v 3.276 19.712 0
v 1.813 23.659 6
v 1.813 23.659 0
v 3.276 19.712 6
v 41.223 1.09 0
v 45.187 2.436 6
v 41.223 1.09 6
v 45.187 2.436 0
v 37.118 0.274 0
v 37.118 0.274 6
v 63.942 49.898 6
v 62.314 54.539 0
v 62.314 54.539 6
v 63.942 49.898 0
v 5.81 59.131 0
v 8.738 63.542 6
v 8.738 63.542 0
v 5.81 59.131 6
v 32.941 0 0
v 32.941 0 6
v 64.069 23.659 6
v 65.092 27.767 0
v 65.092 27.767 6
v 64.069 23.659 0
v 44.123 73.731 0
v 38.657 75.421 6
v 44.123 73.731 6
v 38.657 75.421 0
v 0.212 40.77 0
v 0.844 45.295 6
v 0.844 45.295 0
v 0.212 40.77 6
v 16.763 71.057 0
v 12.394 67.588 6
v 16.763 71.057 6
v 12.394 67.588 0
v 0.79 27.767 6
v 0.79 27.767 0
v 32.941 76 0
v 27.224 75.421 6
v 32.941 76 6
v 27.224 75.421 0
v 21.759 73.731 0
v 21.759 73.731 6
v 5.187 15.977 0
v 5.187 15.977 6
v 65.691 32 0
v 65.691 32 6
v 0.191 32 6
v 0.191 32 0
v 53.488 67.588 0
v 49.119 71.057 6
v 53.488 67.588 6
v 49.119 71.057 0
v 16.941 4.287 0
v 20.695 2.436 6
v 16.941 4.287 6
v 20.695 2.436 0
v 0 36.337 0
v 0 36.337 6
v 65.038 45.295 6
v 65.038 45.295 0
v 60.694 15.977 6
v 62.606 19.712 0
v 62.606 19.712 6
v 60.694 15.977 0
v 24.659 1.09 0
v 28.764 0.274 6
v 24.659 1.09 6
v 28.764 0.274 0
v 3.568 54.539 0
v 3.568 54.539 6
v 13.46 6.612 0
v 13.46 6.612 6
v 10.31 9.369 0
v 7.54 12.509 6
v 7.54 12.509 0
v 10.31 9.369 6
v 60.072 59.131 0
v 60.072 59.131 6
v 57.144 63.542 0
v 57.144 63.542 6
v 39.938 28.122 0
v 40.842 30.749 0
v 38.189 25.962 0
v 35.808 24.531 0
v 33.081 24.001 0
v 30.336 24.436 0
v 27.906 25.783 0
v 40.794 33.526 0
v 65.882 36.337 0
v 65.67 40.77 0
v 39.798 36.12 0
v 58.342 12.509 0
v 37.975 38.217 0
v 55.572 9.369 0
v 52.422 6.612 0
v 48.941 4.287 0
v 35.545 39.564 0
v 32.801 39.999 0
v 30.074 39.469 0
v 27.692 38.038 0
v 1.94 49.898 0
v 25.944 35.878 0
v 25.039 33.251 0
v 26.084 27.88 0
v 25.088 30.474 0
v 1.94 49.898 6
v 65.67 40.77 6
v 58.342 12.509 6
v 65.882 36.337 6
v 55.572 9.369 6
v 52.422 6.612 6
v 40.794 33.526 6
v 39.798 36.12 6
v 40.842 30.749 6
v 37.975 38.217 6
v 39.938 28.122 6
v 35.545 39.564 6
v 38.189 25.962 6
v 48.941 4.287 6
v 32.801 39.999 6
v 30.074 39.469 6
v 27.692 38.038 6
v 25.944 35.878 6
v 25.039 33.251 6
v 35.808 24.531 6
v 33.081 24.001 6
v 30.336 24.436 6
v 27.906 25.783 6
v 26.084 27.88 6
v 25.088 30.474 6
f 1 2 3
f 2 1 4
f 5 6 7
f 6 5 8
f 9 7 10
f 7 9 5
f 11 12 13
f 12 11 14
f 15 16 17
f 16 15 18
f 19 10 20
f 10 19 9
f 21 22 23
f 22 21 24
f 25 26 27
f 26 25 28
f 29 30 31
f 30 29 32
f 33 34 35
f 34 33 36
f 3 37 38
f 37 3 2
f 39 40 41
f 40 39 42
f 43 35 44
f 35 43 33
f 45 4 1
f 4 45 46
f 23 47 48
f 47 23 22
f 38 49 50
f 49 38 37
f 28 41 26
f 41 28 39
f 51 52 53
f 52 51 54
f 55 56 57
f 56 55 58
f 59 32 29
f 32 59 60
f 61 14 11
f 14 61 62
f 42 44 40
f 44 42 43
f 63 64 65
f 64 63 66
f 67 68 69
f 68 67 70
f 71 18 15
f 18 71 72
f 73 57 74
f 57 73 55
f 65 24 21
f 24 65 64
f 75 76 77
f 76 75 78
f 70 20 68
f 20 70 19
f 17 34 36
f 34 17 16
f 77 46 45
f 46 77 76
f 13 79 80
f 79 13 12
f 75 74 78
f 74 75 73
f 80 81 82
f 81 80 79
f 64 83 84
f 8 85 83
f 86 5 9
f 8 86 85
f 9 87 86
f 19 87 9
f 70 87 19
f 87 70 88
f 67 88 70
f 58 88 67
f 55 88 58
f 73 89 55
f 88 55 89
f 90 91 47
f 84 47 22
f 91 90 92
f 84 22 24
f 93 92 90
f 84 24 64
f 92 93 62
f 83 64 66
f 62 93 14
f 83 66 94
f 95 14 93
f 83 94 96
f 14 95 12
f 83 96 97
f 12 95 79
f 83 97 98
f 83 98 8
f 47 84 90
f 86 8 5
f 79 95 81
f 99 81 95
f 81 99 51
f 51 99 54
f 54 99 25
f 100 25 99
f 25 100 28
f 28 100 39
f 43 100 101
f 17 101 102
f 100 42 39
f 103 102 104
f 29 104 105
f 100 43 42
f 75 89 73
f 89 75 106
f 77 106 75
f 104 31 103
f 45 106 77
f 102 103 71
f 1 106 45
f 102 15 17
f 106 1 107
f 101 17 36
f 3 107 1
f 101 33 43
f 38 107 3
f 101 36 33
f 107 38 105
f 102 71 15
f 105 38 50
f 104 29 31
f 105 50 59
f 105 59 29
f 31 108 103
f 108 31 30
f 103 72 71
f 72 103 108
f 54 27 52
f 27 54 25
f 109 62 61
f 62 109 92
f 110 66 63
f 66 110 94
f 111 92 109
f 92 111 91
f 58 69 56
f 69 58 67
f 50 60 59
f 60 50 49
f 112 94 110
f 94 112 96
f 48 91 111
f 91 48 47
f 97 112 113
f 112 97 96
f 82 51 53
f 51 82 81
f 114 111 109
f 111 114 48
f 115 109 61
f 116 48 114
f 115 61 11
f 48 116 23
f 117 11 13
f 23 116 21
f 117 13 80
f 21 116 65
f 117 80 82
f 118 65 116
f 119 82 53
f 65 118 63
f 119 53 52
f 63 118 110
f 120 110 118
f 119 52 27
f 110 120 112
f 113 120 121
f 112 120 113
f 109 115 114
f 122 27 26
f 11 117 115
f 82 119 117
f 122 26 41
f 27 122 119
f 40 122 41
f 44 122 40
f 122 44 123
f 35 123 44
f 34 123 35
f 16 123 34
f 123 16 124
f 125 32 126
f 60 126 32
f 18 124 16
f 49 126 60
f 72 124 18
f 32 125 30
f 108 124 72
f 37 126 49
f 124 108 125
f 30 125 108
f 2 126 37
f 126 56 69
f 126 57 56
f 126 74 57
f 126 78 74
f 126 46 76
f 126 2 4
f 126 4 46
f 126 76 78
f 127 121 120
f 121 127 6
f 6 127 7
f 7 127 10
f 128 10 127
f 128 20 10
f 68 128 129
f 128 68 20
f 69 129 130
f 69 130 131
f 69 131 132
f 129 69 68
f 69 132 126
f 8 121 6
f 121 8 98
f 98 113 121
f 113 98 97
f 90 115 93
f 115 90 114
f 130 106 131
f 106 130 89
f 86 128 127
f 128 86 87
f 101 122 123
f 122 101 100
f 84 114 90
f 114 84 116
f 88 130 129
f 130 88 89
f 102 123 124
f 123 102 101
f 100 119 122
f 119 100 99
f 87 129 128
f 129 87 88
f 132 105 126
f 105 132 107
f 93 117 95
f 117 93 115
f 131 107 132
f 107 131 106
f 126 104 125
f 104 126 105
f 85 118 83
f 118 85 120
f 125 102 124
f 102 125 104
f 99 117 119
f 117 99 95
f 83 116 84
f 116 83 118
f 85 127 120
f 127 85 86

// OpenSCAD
$fn = 32;

// ----------------------------------------------------------------------
// Cam plate: single_lobe cam, base R32
// ----------------------------------------------------------------------

// --- parameters (mm) ---
base_r = 32;              // base circle radius
lobe_h = 12;              // cam lobe rise
bore_r = 8;               // shaft bore radius
plate_t = 6;              // plate thickness, Z (extrusion height)

profile = [[65.691, 32], [65.882, 36.337], [65.67, 40.77], [65.038, 45.295], [63.942, 49.898], [62.314, 54.539], [60.072, 59.131], [57.144, 63.542], [53.488, 67.588], [49.119, 71.057], [44.123, 73.731], [38.657, 75.421], [32.941, 76], [27.224, 75.421], [21.759, 73.731], [16.763, 71.057], [12.394, 67.588], [8.738, 63.542], [5.81, 59.131], [3.568, 54.539], [1.94, 49.898], [0.844, 45.295], [0.212, 40.77], [0, 36.337], [0.191, 32], [0.79, 27.767], [1.813, 23.659], [3.276, 19.712], [5.187, 15.977], [7.54, 12.509], [10.31, 9.369], [13.46, 6.612], [16.941, 4.287], [20.695, 2.436], [24.659, 1.09], [28.764, 0.274], [32.941, 0], [37.118, 0.274], [41.223, 1.09], [45.187, 2.436], [48.941, 4.287], [52.422, 6.612], [55.572, 9.369], [58.342, 12.509], [60.694, 15.977], [62.606, 19.712], [64.069, 23.659], [65.092, 27.767]];  // primary outline, 48 points, counter clockwise
void_1 = [[40.794, 33.526], [39.798, 36.12], [37.975, 38.217], [35.545, 39.564], [32.801, 39.999], [30.074, 39.469], [27.692, 38.038], [25.944, 35.878], [25.039, 33.251], [25.088, 30.474], [26.084, 27.88], [27.906, 25.783], [30.336, 24.436], [33.081, 24.001], [35.808, 24.531], [38.189, 25.962], [39.938, 28.122], [40.842, 30.749]];  // shaft bore, 18 points

// --- the one profile operation ---
difference() {
  linear_extrude(height = plate_t) polygon(points = profile);
  translate([0, 0, -1])
    linear_extrude(height = plate_t + 2) polygon(points = void_1);
}
